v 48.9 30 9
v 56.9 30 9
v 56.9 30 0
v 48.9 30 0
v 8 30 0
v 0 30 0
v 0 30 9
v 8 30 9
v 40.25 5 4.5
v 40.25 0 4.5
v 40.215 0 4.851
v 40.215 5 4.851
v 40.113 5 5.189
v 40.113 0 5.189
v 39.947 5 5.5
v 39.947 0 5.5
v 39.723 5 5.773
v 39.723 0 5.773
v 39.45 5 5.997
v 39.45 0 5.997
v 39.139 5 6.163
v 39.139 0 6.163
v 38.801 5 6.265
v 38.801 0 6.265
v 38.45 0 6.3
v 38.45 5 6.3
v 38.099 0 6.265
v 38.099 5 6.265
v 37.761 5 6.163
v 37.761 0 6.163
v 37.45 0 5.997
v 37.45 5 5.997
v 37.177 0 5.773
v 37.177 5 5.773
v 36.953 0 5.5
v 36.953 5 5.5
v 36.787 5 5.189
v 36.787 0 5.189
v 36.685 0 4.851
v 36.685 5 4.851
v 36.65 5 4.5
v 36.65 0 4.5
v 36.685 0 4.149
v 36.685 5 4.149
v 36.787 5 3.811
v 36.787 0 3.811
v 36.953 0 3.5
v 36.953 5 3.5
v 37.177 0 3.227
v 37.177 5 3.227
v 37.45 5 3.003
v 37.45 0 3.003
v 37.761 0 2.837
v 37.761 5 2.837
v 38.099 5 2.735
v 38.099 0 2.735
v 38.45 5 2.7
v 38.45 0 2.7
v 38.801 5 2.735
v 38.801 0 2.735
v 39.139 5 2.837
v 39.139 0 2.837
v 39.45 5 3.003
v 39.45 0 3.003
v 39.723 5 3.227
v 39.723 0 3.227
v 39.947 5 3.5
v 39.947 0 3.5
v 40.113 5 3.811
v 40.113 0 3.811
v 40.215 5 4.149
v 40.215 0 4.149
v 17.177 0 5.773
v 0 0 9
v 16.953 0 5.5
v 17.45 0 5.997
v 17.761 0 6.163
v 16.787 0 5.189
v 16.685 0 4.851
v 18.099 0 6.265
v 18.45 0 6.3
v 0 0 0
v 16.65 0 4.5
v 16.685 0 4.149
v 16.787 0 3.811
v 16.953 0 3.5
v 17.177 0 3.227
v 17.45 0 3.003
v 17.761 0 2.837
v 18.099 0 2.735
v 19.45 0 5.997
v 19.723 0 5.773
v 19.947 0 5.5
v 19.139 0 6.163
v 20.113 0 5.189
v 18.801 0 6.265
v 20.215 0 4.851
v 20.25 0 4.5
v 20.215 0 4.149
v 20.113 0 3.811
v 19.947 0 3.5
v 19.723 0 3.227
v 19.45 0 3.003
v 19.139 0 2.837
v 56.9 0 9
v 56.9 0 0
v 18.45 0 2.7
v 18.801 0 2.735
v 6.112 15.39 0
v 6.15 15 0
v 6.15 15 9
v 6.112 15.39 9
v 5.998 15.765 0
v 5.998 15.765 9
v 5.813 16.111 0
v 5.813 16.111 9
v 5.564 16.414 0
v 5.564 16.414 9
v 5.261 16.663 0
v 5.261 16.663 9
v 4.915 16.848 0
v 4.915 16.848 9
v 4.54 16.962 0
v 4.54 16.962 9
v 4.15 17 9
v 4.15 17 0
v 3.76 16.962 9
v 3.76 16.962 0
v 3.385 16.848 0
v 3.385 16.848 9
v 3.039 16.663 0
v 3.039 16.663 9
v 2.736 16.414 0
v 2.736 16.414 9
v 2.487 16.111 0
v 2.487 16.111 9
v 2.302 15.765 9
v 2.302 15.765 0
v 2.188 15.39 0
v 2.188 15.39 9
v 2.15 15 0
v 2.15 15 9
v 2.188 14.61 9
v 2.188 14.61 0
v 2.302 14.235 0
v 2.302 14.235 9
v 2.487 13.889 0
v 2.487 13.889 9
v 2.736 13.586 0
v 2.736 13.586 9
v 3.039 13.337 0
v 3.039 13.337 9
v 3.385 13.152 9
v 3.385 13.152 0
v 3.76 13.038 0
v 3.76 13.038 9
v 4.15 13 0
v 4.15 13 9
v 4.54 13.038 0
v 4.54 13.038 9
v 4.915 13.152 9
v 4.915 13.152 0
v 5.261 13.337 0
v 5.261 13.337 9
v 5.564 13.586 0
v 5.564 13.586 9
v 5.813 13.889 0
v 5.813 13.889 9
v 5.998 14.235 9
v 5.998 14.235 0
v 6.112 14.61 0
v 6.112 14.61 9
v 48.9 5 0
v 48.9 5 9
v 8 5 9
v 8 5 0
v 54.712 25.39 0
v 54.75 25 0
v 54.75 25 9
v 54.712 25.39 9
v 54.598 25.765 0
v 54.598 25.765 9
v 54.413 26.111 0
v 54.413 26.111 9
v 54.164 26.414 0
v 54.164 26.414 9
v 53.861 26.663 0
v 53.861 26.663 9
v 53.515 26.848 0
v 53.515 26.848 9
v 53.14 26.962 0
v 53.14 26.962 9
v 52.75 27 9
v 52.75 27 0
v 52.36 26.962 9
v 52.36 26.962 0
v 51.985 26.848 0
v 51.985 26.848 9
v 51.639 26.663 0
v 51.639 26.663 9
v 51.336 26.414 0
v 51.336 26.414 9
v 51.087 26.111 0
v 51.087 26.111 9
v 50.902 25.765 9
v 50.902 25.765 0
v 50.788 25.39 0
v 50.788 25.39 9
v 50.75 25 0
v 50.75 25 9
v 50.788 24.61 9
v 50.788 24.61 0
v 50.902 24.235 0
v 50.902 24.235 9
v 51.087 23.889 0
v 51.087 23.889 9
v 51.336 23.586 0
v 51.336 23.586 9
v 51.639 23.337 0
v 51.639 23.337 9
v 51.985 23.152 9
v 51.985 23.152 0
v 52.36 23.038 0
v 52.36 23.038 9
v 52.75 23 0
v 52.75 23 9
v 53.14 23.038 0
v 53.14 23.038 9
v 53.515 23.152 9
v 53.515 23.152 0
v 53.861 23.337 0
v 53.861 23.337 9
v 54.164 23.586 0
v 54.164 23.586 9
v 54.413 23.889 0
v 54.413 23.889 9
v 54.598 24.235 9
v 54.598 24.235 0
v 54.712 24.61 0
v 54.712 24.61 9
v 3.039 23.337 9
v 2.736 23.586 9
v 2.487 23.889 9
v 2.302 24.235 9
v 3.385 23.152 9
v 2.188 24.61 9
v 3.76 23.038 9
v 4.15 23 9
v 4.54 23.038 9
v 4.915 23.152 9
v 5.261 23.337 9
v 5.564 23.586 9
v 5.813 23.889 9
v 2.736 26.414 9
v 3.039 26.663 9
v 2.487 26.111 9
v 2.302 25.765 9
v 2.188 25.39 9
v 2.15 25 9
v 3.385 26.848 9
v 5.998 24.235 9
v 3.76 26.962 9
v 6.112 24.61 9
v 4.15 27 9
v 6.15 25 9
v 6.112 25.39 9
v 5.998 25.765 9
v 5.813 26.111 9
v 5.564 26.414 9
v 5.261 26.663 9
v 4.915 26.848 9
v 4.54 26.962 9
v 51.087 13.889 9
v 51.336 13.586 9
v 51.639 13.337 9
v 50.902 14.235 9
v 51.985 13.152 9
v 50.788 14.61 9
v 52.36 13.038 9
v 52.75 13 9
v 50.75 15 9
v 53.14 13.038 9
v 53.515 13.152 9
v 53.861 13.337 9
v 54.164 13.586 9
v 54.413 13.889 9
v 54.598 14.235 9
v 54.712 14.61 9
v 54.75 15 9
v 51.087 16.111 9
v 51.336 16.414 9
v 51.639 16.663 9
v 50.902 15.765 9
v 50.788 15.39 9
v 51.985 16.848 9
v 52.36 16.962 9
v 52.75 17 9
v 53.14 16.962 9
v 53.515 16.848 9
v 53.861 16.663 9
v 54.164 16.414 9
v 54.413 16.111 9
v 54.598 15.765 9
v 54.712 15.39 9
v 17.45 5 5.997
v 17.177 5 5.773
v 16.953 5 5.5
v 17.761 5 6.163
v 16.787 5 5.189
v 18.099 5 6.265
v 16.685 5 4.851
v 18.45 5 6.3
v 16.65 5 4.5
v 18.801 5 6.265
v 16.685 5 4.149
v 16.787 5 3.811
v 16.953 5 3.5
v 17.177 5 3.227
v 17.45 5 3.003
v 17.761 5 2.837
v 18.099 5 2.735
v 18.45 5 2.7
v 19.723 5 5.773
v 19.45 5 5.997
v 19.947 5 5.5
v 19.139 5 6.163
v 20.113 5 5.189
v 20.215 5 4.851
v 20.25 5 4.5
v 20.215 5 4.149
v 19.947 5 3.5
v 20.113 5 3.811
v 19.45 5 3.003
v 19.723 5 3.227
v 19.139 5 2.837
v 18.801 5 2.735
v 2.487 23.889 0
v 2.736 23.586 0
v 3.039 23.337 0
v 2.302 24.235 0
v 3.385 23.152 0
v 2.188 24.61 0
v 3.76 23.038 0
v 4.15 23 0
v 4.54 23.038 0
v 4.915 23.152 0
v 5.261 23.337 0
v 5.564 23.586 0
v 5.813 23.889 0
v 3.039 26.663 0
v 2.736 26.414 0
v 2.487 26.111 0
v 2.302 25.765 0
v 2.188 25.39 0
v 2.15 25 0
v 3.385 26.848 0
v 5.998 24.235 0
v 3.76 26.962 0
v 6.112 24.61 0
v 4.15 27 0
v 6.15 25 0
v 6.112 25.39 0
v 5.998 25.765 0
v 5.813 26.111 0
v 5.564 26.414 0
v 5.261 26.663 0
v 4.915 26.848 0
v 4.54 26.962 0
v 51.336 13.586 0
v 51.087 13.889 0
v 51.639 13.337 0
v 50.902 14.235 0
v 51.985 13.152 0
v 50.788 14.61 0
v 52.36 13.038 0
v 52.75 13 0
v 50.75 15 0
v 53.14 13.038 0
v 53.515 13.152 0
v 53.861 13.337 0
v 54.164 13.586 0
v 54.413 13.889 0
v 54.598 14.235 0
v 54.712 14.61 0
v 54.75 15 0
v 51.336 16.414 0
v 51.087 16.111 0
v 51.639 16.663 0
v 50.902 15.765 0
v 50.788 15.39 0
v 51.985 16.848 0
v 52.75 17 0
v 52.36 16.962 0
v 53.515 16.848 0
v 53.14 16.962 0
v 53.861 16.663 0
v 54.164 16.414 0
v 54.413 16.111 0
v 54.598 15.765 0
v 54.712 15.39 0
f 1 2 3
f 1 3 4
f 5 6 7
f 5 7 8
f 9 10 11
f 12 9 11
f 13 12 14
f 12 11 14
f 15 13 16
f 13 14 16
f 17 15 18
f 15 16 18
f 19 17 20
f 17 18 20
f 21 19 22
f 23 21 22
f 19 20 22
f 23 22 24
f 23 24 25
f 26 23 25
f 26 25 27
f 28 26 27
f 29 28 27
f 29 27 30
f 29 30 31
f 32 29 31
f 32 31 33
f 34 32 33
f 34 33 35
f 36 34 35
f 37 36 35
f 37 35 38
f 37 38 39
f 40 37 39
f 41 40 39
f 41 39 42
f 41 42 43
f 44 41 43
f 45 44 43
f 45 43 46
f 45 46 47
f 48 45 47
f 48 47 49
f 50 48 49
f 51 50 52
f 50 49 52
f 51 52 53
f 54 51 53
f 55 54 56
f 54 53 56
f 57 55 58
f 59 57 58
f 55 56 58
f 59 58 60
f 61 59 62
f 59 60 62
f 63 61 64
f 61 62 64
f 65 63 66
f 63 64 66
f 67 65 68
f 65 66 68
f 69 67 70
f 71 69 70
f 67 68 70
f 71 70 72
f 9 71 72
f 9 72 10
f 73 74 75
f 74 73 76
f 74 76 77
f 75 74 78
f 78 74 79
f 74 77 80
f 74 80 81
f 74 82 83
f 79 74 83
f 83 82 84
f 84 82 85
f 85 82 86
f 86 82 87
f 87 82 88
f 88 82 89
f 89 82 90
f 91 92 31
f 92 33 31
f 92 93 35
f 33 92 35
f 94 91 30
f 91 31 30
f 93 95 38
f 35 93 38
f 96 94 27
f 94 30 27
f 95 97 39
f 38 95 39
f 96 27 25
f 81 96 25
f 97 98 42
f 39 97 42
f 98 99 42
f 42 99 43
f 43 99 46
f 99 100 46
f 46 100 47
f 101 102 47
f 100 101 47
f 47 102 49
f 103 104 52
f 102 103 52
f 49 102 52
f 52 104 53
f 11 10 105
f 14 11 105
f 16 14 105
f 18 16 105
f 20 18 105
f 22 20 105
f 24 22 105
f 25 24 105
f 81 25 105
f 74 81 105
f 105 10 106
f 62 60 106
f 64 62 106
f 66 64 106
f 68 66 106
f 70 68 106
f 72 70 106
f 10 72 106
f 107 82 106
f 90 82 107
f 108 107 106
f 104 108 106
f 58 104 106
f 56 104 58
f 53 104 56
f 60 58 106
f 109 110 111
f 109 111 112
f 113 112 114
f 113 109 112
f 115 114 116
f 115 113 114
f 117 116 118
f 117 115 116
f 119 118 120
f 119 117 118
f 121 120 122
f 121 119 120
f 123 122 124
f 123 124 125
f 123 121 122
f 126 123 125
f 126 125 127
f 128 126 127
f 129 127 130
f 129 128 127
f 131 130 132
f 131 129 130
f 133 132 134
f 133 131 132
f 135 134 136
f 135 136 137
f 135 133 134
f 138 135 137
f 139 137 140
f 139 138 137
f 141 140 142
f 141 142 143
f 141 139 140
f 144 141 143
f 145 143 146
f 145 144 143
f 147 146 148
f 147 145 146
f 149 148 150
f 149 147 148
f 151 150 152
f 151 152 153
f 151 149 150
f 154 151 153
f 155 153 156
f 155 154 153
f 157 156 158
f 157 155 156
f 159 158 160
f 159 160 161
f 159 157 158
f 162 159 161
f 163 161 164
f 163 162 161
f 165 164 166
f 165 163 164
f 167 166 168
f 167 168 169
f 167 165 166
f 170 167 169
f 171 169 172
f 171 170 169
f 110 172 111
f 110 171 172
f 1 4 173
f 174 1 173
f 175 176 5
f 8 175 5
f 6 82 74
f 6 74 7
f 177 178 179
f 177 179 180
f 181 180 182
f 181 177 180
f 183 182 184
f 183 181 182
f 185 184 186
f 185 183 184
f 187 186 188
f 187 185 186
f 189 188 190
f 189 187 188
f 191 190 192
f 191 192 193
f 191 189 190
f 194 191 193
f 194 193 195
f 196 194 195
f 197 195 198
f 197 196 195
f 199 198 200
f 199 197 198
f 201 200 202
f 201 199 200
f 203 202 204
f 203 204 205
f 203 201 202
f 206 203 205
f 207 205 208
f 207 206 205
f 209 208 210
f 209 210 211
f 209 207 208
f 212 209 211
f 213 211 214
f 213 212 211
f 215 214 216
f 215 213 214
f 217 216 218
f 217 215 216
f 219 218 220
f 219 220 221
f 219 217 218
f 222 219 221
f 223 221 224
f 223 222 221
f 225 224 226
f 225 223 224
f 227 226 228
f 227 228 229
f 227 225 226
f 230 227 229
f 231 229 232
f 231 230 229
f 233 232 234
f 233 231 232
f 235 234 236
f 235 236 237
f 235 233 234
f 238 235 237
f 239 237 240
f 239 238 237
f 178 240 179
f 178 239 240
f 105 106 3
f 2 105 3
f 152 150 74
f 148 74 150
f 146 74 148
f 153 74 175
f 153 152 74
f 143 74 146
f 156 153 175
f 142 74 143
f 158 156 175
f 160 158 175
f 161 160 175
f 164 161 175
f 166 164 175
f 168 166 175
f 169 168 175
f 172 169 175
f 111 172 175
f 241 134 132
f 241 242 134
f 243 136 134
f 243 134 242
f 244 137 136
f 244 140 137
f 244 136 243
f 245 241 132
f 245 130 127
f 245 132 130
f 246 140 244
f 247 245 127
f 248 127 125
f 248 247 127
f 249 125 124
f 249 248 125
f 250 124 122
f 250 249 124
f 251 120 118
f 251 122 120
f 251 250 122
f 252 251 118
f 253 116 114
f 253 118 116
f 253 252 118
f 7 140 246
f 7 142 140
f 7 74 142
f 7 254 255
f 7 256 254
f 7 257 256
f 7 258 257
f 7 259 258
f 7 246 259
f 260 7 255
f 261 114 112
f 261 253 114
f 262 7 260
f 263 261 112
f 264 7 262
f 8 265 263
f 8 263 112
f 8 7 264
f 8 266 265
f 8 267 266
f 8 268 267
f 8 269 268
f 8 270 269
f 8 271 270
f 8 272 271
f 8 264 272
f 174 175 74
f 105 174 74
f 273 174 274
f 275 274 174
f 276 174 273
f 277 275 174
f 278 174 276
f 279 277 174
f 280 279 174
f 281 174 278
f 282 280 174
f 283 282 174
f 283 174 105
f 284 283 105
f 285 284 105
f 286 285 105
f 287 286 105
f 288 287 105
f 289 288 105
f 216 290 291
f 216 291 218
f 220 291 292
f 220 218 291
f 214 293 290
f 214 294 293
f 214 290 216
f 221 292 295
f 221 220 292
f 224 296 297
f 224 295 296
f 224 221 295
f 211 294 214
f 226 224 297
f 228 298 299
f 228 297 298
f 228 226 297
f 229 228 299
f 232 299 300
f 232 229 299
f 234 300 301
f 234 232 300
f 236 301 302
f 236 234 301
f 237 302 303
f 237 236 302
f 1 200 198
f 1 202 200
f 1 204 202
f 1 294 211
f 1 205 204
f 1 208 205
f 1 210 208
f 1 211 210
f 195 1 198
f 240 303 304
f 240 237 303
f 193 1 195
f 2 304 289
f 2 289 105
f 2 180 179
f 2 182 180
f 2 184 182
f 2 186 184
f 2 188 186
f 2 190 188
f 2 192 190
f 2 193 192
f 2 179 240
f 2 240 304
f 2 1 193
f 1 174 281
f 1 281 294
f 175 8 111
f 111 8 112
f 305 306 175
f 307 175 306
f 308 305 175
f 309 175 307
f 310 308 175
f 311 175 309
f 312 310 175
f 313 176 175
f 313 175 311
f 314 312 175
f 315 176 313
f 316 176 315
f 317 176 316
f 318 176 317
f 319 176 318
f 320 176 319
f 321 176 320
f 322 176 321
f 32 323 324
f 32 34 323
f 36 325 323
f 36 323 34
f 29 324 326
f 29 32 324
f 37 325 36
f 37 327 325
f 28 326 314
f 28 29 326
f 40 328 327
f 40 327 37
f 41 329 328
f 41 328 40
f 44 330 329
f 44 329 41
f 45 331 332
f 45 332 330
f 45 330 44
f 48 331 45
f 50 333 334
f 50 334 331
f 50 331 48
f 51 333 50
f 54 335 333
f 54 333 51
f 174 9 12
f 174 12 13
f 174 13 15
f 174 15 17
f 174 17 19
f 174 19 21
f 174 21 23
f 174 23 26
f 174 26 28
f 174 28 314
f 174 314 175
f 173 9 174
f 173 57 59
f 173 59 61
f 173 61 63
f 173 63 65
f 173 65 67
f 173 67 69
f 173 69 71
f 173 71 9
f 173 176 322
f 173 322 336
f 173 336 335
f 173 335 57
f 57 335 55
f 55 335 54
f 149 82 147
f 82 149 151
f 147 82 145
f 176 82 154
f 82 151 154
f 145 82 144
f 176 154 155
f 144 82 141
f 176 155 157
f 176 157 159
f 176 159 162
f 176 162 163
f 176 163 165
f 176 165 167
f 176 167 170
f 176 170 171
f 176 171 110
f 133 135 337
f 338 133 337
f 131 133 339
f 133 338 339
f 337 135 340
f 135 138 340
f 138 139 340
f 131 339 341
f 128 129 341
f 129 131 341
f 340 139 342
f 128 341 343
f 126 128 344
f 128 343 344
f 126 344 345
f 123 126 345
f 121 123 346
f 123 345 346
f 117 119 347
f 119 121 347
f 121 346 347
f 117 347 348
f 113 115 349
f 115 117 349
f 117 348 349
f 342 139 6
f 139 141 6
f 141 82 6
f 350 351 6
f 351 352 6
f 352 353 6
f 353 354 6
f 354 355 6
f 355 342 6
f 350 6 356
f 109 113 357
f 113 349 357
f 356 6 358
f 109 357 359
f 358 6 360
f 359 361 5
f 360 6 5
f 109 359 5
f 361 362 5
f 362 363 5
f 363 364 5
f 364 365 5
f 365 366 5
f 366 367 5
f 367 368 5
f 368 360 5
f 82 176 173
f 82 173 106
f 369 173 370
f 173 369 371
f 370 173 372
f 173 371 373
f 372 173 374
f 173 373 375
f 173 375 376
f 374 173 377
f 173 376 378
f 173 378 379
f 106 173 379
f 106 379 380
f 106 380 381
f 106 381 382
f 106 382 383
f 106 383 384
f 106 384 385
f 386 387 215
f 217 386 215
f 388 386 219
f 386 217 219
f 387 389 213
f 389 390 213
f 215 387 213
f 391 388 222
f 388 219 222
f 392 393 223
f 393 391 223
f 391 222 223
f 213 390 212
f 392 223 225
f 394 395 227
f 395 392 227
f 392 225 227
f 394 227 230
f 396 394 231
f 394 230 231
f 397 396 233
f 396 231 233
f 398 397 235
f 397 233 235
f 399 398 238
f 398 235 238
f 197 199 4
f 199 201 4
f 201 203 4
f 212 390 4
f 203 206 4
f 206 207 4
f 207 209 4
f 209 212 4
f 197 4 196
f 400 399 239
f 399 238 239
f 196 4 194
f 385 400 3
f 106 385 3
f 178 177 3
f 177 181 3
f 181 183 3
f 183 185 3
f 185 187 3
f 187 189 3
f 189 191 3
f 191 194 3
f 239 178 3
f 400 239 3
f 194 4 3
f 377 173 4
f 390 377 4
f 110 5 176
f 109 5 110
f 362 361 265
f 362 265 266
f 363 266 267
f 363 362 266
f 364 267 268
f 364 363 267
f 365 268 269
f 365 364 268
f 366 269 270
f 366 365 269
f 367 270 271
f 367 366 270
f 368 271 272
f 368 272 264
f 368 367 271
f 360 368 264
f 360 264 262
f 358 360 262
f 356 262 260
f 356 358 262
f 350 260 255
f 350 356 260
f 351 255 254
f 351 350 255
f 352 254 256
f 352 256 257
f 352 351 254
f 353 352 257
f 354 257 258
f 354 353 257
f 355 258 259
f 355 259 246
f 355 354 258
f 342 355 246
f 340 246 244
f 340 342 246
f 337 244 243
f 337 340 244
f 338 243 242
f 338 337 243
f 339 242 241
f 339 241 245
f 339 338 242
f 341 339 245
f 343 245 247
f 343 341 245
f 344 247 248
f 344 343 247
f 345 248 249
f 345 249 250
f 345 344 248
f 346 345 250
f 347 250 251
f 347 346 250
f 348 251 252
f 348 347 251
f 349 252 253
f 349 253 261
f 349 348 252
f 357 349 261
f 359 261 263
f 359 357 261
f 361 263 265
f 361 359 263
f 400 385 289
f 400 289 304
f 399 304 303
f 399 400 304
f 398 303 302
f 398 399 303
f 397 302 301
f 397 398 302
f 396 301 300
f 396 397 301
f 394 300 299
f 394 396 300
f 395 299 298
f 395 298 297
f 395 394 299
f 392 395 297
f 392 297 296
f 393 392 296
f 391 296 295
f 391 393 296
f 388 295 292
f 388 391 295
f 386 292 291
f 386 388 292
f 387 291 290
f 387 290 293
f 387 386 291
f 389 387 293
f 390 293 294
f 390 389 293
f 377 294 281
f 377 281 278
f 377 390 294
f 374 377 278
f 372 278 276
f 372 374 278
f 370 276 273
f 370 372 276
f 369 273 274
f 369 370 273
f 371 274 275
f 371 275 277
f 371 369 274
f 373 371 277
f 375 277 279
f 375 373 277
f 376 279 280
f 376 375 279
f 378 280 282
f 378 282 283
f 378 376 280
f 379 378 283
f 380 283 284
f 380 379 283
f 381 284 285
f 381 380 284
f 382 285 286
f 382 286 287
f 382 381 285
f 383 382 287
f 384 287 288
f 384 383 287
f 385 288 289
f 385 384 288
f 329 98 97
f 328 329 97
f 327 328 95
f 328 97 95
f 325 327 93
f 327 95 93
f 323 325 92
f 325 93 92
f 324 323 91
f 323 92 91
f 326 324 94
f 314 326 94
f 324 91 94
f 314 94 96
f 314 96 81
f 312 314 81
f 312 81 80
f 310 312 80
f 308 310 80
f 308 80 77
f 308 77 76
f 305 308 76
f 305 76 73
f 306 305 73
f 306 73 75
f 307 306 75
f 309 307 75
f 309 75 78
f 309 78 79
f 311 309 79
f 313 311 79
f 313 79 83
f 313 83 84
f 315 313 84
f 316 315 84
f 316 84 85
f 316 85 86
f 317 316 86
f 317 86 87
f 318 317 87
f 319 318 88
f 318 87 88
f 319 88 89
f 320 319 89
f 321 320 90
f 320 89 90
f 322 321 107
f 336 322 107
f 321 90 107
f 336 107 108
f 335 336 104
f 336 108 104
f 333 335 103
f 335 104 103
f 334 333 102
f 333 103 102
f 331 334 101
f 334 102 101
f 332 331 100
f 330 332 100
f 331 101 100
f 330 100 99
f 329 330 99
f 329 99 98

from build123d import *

# Parameters (mm, degrees)
ESQUISSE1_W             = 40.9
ESQUISSE1_H             = 5
ESQUISSE1_W_2           = 8
ESQUISSE1_H_2           = 30
ESQUISSE1_R             = 2
BOSS_EXTRU_1_DEPTH      = 9
ESQUISSE2_R             = 1.8
ENL_V_MAT_EXTRU_1_DEPTH = 9


with BuildPart() as part:
    # Esquisse1 → Boss.-Extru.1 (new body)
    # profile 1 of 3: a face of its own
    with BuildSketch(Plane.XY):
        with Locations((28.45, 2.5)):
            Rectangle(ESQUISSE1_W, ESQUISSE1_H)
    # profile 2 of 3: a face of its own
    with BuildSketch(Plane.XY):
        with Locations((4, 15)):
            Rectangle(ESQUISSE1_W_2, ESQUISSE1_H_2)
        with Locations((4.15, 15)):
            Circle(ESQUISSE1_R, mode=Mode.SUBTRACT)
        with Locations((4.15, 25)):
            Circle(ESQUISSE1_R, mode=Mode.SUBTRACT)
    # profile 3 of 3: a face of its own
    with BuildSketch(Plane.XY):
        Polygon((48.9, 5), (48.9, 0), (56.9, 0), (56.9, 30), (48.9, 30), align=None)
        with Locations((52.75, 15)):
            Circle(ESQUISSE1_R, mode=Mode.SUBTRACT)
        with Locations((52.75, 25)):
            Circle(ESQUISSE1_R, mode=Mode.SUBTRACT)
    extrude(amount=BOSS_EXTRU_1_DEPTH)

    # Esquisse2 → Enlèv. mat.-Extru.1 (cut)
    with BuildSketch(Plane.XZ):
        with Locations((18.45, 4.5)):
            Circle(ESQUISSE2_R)
        with Locations((38.45, 4.5)):
            Circle(ESQUISSE2_R)
    extrude(amount=-ENL_V_MAT_EXTRU_1_DEPTH, mode=Mode.SUBTRACT)


solid = part.part
